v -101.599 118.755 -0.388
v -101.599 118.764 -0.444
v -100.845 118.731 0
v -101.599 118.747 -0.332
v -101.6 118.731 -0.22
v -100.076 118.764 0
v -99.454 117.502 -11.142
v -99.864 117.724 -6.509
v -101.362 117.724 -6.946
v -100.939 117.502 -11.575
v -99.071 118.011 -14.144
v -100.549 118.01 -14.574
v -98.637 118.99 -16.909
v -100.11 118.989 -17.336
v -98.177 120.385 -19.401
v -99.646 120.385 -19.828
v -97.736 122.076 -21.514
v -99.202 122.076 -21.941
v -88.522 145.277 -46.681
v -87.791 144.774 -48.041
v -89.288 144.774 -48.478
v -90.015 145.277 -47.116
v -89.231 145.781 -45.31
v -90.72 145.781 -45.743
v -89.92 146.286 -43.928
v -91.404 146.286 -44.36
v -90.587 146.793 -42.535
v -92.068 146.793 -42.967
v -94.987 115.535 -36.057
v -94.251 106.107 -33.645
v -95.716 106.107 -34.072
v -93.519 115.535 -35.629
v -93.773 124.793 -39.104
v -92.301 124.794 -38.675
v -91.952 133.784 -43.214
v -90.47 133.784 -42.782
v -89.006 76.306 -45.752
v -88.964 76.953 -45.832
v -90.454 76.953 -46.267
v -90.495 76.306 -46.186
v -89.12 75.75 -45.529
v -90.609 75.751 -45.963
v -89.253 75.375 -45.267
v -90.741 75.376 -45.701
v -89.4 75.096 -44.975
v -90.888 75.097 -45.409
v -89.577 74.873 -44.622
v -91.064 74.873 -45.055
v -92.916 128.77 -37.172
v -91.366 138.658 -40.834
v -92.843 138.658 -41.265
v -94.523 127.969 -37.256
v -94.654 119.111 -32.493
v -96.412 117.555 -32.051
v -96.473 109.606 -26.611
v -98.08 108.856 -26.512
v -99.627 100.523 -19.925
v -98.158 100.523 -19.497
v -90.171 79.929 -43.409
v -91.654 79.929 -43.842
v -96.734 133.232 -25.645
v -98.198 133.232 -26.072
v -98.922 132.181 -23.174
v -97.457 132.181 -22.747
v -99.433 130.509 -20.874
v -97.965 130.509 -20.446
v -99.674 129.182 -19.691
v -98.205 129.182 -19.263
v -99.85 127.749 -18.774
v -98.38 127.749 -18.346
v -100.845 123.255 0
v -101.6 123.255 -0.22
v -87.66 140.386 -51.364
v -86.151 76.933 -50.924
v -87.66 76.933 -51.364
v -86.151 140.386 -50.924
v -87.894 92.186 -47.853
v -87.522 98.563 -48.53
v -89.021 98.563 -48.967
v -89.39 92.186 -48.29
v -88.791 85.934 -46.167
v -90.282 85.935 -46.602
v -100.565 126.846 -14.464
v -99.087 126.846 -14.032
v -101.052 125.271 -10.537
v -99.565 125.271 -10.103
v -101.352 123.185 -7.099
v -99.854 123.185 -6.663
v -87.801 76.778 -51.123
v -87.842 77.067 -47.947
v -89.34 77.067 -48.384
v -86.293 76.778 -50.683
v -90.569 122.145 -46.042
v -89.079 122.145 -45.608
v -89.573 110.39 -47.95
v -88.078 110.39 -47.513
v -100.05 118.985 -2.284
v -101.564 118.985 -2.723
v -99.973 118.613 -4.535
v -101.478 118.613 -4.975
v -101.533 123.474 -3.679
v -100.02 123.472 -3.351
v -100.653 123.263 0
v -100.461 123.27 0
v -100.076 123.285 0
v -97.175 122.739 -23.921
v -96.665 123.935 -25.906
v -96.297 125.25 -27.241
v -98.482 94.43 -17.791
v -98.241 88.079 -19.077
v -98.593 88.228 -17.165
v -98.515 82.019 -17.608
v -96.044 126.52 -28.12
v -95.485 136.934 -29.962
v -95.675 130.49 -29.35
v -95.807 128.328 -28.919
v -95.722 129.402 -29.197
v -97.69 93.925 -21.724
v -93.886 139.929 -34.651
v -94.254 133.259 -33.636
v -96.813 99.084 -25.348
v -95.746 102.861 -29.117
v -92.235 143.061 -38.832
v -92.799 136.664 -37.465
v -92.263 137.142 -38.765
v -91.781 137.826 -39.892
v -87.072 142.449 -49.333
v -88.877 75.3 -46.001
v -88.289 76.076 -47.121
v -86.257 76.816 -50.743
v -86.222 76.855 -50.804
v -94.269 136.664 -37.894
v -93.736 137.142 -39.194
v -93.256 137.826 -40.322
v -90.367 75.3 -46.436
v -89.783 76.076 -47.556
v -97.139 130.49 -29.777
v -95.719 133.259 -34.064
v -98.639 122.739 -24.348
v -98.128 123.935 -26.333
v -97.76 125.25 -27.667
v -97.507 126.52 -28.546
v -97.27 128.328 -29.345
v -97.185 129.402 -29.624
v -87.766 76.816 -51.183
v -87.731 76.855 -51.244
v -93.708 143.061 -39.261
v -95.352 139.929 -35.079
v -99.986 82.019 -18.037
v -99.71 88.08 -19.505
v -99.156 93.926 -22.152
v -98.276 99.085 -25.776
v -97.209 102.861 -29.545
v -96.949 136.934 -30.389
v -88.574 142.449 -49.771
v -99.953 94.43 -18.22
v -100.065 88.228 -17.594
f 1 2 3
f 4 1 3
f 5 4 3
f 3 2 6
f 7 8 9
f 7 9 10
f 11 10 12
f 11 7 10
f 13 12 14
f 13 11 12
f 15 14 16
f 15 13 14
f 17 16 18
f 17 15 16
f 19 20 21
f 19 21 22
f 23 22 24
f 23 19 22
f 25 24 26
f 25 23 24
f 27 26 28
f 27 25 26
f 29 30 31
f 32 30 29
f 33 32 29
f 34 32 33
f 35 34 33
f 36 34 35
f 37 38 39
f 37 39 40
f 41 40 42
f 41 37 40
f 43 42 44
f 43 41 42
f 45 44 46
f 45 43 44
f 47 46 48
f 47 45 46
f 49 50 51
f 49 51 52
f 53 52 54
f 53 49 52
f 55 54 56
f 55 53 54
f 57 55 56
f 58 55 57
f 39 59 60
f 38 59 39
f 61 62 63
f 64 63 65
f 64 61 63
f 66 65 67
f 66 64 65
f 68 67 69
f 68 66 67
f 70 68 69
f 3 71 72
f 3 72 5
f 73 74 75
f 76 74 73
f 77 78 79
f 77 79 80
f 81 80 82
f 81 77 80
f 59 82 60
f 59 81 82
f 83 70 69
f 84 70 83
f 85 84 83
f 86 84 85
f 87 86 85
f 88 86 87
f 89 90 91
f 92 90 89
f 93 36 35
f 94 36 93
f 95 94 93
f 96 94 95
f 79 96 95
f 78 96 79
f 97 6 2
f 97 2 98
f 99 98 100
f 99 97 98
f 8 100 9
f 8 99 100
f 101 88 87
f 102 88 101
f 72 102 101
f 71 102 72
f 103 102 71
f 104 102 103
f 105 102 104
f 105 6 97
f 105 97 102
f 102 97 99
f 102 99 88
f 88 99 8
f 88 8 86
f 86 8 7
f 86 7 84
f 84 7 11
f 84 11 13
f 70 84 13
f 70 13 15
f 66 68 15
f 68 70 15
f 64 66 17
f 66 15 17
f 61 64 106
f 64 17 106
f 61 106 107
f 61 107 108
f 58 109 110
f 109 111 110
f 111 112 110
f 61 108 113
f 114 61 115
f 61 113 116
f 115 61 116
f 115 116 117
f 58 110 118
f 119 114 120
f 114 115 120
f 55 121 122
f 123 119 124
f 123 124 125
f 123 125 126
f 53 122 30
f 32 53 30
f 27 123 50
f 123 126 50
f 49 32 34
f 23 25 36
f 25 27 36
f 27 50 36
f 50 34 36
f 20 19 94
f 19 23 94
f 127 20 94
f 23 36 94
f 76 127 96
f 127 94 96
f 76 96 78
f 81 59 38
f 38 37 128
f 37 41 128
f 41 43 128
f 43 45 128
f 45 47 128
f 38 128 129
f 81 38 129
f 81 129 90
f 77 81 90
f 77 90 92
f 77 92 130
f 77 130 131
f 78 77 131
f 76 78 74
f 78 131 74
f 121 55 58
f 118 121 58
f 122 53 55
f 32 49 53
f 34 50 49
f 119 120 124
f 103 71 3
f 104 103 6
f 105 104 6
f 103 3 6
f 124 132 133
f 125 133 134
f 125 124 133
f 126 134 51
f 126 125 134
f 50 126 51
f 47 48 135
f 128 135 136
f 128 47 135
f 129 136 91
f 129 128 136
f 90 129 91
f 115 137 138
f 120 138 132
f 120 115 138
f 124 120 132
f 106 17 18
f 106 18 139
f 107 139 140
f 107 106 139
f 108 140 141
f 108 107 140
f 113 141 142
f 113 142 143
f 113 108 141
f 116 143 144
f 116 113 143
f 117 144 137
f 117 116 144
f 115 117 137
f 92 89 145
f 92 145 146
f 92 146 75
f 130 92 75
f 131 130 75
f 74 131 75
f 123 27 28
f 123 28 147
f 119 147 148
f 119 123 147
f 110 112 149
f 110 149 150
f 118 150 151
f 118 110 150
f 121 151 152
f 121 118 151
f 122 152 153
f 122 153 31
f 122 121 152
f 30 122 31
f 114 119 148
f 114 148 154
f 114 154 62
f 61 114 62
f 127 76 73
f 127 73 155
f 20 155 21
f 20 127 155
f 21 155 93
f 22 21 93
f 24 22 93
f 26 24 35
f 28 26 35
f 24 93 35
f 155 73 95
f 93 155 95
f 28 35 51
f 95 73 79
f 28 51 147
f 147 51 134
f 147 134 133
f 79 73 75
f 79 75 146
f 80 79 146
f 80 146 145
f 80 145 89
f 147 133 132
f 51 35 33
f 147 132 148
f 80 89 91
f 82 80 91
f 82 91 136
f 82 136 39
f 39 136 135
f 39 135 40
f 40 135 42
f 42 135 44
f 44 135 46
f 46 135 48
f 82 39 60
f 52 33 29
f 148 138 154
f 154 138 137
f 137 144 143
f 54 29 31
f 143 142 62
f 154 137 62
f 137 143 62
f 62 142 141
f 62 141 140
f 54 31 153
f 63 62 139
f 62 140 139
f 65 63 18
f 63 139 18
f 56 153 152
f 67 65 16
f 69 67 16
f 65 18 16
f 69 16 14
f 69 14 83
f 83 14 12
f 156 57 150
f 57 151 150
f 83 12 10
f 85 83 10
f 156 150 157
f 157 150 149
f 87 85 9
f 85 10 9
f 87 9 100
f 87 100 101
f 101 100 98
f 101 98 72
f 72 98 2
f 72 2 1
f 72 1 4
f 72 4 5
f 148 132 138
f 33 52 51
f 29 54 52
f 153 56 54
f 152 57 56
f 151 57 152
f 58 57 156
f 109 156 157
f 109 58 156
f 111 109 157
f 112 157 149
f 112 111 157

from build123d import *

# Parameters (mm, degrees)
BASE_FLANGE1_DEPTH = 152.4
CUT_EXTRUDE2_DEPTH = 210.453765781
SKETCH8_OUTSIDE_W  = 91.669
SKETCH8_OUTSIDE_H  = 186.952
CUT_EXTRUDE3_DEPTH = 156.159268245
CUT_EXTRUDE5_DEPTH = 150.529804304
CUT_EXTRUDE6_DEPTH = 150.529804304


# Sheet-metal steps are written as plain solids
with BuildPart() as part:
    # Sketch1 → Base-Flange1 (new body)
    with BuildSketch(Plane(origin=(0, 0, 0), x_dir=(1, 0, 0), z_dir=(0, 1, 0))):
        with BuildLine():
            ThreePointArc((101.6, 0), (0, 101.6), (-101.6, 0))
            Line((-101.6, 0), (-100.076, 0))
            ThreePointArc((-100.076, 0), (0, 100.076), (100.076, 0))
            Line((100.076, 0), (101.6, 0))
        make_face()
    extrude(amount=BASE_FLANGE1_DEPTH)

    # Sketch7 → Cut-Extrude2 (cut, through all)
    with BuildSketch(Plane(origin=(0, 0, 0), x_dir=(1, 0, 0), z_dir=(0, 1, 0))):
        Polygon((-91.709043777, 57.490350595), (138.01260718, -58.815220223), (145.858691999, 79.364012989), (-90.642426647, 185.885465098), align=None)
    extrude(amount=CUT_EXTRUDE2_DEPTH, mode=Mode.SUBTRACT)

    # Sketch8 outside → Cut-Extrude3 (cut, through all)
    with BuildSketch(Plane(origin=(-92.234633035, 0, -26.893225996), x_dir=(-0.27991806035793976, 0, 0.9600238952679506), z_dir=(-0.9600238952679506, 0, -0.27991806035793976))):
        with Locations((-0.1185, 76.2)):
            Rectangle(SKETCH8_OUTSIDE_W, SKETCH8_OUTSIDE_H)
        with BuildLine():
            Line((28.228420724, 123.255255295), (28.228420724, 63.013426534))
            Line((28.228420724, 63.013426534), (-23.710305665, 67.943144138))
            Line((-23.710305665, 67.943144138), (-24.773491826, 75.417539706))
            Line((-24.773491826, 75.417539706), (-24.773491826, 140.385814226))
            ThreePointArc((-24.773491826, 140.385814226), (-22.985555805, 142.451644443), (-21.54666964, 144.774137995))
            Line((-21.54666964, 144.774137995), (-15.477635794, 146.793089403))
            ThreePointArc((-15.477635794, 146.793089403), (-11.468978559, 143.067294692), (-6.985554285, 139.928857844))
            ThreePointArc((-6.985554285, 139.928857844), (-2.02114191, 136.922848828), (2.45774455, 133.232177276))
            ThreePointArc((2.45774455, 133.232177276), (6.806375414, 131.32724859), (9.926241691, 127.748732402))
            ThreePointArc((9.926241691, 127.748732402), (16.039086335, 126.228175305), (21.554569405, 123.185411754))
            ThreePointArc((21.554569405, 123.185411754), (24.888843169, 123.473733589), (28.228420724, 123.255255295))
        make_face(mode=Mode.SUBTRACT)
    extrude(amount=CUT_EXTRUDE3_DEPTH, mode=Mode.SUBTRACT)

    # Sketch9 → Cut-Extrude5 (cut, through all)
    with BuildSketch(Plane(origin=(-92.234633035, 0, -26.893225996), x_dir=(-0.27991806035793976, 0, 0.9600238952679506), z_dir=(-0.9600238952679506, 0, -0.27991806035793976))):
        with BuildLine():
            Line((-24.501828907, 76.777557676), (-27.569176237, 78.5320759))
            Line((-27.569176237, 78.5320759), (-29.494089624, 68.863518536))
            Line((-29.494089624, 68.863518536), (-21.26675398, 50.764523355))
            Line((-21.26675398, 50.764523355), (28.228420724, 57.34408301))
            Line((28.228420724, 57.34408301), (28.013079808, 118.763565618))
            ThreePointArc((28.013079808, 118.763565618), (24.75429403, 118.880140281), (21.705230571, 117.724075223))
            ThreePointArc((21.705230571, 117.724075223), (13.693303318, 118.137203319), (6.704304858, 122.076182077))
            ThreePointArc((6.704304858, 122.076182077), (1.166010219, 124.850428459), (-1.395339362, 130.490343247))
            ThreePointArc((-1.395339362, 130.490343247), (-5.917319527, 133.265505392), (-9.991337743, 136.664358893))
            ThreePointArc((-9.991337743, 136.664358893), (-11.942393165, 137.4181864), (-13.626649766, 138.658409311))
            ThreePointArc((-13.626649766, 138.658409311), (-4.330180004, 118.477783543), (8.758521079, 100.523176602))
            ThreePointArc((8.758521079, 100.523176602), (10.931974112, 91.396763407), (10.672272602, 82.018710783))
            ThreePointArc((10.672272602, 82.018710783), (5.176812074, 95.990549965), (-5.917317854, 106.106510507))
            ThreePointArc((-5.917317854, 106.106510507), (-9.582838682, 120.389201142), (-15.747934485, 133.784084063))
            ThreePointArc((-15.747934485, 133.784084063), (-20.011123577, 116.370294996), (-22.090885373, 98.563290146))
            ThreePointArc((-22.090885373, 98.563290146), (-20.494324779, 88.872234651), (-16.433576157, 79.929311026))
            ThreePointArc((-16.433576157, 79.929311026), (-17.84229029, 78.509895577), (-19.097539053, 76.953114838))
            ThreePointArc((-19.097539053, 76.953114838), (-18.740022488, 75.714547524), (-17.763603379, 74.872839255))
            ThreePointArc((-17.763603379, 74.872839255), (-19.832219816, 75.585249002), (-21.44191431, 77.066999739))
            ThreePointArc((-21.44191431, 77.066999739), (-22.961230073, 76.809778861), (-24.501828907, 76.777557676))
        make_face()
    extrude(amount=CUT_EXTRUDE5_DEPTH, mode=Mode.SUBTRACT)

    # Sketch10 → Cut-Extrude6 (cut, through all)
    with BuildSketch(Plane(origin=(-92.234633035, 0, -26.893225996), x_dir=(-0.27991806035793976, 0, 0.9600238952679506), z_dir=(-0.9600238952679506, 0, -0.27991806035793976))):
        Polygon((28.013079808, 118.763565618), (28.728121694, 118.655926759), (28.728121694, 52.453532496), (22.818416534, 52.453532496), (26.943491202, 118.763565618), align=None)
    extrude(amount=CUT_EXTRUDE6_DEPTH, mode=Mode.SUBTRACT)


solid = part.part
